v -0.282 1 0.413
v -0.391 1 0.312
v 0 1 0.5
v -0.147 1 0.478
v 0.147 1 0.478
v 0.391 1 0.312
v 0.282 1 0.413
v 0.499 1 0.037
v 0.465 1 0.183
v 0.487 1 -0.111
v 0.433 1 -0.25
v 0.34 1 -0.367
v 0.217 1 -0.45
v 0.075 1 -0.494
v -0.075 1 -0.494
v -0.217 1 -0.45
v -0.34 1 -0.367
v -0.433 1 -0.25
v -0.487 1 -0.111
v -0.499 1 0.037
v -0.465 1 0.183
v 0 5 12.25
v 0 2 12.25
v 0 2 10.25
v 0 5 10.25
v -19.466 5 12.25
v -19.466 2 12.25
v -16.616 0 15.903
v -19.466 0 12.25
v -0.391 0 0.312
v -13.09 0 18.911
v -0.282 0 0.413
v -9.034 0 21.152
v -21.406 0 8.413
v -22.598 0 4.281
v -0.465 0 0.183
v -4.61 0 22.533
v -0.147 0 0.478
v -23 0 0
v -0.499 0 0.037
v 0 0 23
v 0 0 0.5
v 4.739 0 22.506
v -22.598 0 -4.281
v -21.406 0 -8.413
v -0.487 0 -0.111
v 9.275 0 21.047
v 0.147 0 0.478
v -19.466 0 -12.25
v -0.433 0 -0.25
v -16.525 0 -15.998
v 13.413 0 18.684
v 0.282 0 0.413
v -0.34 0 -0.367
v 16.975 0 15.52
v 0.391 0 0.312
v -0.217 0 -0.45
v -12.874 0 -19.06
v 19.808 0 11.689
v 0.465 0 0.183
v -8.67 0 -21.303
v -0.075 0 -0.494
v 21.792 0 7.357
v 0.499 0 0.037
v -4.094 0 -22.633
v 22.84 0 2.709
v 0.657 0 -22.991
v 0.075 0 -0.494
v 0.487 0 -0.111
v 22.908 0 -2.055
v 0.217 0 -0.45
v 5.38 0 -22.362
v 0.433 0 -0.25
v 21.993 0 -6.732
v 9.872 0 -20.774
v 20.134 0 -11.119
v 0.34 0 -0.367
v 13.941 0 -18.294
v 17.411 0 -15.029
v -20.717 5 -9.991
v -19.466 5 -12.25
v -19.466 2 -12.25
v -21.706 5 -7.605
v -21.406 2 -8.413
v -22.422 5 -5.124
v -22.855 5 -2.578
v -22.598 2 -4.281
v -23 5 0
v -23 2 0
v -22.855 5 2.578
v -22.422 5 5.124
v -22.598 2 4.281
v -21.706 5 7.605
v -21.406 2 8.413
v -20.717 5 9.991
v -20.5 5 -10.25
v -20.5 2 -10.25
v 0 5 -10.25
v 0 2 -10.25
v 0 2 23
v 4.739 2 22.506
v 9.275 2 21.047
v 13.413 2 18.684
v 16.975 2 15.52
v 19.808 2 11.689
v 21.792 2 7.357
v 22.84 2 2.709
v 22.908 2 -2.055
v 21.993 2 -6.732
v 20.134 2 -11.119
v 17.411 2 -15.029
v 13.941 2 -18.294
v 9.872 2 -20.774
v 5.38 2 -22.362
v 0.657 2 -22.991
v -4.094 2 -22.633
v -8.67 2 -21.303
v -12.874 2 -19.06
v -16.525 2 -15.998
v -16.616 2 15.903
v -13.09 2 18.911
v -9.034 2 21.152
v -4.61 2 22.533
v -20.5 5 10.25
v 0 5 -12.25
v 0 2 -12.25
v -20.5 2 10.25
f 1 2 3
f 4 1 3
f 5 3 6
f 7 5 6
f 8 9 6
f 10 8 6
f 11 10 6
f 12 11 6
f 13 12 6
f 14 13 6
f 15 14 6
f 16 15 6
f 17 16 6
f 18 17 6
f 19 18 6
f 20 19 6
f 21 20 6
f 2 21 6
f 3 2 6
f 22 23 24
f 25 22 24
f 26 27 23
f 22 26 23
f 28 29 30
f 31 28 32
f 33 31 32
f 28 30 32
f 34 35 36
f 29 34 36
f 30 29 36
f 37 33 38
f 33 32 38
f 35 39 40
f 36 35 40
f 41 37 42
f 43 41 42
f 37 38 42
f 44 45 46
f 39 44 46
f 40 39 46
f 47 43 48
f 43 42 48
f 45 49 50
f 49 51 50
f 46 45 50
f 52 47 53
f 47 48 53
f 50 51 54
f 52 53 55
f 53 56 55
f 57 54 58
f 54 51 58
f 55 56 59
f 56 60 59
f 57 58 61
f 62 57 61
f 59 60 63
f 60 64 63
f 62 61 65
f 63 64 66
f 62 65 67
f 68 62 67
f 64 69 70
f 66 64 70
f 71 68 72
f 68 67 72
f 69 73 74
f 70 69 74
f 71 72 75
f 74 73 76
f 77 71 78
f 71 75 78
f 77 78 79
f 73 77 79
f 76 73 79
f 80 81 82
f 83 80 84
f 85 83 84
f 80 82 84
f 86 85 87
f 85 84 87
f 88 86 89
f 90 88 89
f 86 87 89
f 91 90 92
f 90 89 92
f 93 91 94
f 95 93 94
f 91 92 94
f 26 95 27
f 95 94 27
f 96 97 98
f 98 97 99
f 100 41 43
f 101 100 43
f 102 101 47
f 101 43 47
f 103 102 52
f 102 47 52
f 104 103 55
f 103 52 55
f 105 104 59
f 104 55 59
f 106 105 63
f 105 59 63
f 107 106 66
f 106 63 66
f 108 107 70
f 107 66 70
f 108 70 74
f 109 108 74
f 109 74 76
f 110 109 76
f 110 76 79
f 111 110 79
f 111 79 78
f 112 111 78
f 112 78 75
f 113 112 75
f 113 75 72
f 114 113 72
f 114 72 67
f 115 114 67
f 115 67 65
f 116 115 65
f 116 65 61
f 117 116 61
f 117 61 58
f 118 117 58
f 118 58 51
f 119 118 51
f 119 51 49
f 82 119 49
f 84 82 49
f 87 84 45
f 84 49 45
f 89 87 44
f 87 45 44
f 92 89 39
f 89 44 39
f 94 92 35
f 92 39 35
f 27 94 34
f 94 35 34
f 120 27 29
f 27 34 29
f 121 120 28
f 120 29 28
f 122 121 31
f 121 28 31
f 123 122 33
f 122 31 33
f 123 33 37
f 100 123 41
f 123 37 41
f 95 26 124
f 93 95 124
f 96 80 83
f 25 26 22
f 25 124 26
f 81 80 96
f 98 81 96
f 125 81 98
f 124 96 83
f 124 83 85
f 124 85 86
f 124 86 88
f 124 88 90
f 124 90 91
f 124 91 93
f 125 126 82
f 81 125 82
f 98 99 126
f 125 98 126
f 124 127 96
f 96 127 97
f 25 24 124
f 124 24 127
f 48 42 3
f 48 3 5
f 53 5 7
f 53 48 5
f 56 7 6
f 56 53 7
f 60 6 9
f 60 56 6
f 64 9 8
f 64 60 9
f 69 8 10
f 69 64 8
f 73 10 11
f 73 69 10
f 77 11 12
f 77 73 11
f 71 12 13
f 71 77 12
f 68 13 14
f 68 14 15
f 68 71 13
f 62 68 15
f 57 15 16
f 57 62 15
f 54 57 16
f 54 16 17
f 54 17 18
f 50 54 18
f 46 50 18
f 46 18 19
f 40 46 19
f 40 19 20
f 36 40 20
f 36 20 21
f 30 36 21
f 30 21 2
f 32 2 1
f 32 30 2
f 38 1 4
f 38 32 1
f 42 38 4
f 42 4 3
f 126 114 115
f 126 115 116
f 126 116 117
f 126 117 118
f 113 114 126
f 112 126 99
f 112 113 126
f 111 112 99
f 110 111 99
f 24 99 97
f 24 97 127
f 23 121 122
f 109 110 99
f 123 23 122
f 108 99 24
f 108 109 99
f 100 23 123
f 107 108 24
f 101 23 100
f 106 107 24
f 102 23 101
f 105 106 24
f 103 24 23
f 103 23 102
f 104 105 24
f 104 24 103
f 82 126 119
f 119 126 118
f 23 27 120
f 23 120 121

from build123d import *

# Parameters (mm, degrees)
SKETCH1_R           = 23
BOSS_EXTRUDE1_DEPTH = 2
SKETCH3_R           = 0.5
CUT_EXTRUDE2_DEPTH  = 1
BOSS_EXTRUDE2_DEPTH = 5


with BuildPart() as part:
    # Sketch1 → Boss-Extrude1 (new body)
    with BuildSketch(Plane(origin=(0, 0, 0), x_dir=(1, 0, 0), z_dir=(0, 1, 0))):
        with Locations(Location((0, 0, 0), (0, 0, 270))):
            Circle(SKETCH1_R)
    extrude(amount=BOSS_EXTRUDE1_DEPTH)

    # Sketch3 → Cut-Extrude2 (cut)
    with BuildSketch(Plane(origin=(0, 0, 0), x_dir=(1, 0, 0), z_dir=(0, 1, 0))):
        with Locations(Location((0, 0, 0), (0, 0, 270))):
            Circle(SKETCH3_R)
    extrude(amount=CUT_EXTRUDE2_DEPTH, mode=Mode.SUBTRACT)

    # Sketch4 → Boss-Extrude2 (add)
    with BuildSketch(Plane(origin=(0, 0, 0), x_dir=(1, 0, 0), z_dir=(0, 1, 0))):
        with BuildLine():
            Line((0, 10.25), (0, 12.25))
            Line((0, 12.25), (-19.466317063, 12.25))
            ThreePointArc((-19.466317063, 12.25), (-23, 0), (-19.466317063, -12.25))
            Line((-19.466317063, -12.25), (0, -12.25))
            Line((0, -12.25), (0, -10.25))
            Line((0, -10.25), (-20.5, -10.25))
            Line((-20.5, -10.25), (-20.5, 10.25))
            Line((-20.5, 10.25), (0, 10.25))
        make_face()
    extrude(amount=BOSS_EXTRUDE2_DEPTH)


solid = part.part
